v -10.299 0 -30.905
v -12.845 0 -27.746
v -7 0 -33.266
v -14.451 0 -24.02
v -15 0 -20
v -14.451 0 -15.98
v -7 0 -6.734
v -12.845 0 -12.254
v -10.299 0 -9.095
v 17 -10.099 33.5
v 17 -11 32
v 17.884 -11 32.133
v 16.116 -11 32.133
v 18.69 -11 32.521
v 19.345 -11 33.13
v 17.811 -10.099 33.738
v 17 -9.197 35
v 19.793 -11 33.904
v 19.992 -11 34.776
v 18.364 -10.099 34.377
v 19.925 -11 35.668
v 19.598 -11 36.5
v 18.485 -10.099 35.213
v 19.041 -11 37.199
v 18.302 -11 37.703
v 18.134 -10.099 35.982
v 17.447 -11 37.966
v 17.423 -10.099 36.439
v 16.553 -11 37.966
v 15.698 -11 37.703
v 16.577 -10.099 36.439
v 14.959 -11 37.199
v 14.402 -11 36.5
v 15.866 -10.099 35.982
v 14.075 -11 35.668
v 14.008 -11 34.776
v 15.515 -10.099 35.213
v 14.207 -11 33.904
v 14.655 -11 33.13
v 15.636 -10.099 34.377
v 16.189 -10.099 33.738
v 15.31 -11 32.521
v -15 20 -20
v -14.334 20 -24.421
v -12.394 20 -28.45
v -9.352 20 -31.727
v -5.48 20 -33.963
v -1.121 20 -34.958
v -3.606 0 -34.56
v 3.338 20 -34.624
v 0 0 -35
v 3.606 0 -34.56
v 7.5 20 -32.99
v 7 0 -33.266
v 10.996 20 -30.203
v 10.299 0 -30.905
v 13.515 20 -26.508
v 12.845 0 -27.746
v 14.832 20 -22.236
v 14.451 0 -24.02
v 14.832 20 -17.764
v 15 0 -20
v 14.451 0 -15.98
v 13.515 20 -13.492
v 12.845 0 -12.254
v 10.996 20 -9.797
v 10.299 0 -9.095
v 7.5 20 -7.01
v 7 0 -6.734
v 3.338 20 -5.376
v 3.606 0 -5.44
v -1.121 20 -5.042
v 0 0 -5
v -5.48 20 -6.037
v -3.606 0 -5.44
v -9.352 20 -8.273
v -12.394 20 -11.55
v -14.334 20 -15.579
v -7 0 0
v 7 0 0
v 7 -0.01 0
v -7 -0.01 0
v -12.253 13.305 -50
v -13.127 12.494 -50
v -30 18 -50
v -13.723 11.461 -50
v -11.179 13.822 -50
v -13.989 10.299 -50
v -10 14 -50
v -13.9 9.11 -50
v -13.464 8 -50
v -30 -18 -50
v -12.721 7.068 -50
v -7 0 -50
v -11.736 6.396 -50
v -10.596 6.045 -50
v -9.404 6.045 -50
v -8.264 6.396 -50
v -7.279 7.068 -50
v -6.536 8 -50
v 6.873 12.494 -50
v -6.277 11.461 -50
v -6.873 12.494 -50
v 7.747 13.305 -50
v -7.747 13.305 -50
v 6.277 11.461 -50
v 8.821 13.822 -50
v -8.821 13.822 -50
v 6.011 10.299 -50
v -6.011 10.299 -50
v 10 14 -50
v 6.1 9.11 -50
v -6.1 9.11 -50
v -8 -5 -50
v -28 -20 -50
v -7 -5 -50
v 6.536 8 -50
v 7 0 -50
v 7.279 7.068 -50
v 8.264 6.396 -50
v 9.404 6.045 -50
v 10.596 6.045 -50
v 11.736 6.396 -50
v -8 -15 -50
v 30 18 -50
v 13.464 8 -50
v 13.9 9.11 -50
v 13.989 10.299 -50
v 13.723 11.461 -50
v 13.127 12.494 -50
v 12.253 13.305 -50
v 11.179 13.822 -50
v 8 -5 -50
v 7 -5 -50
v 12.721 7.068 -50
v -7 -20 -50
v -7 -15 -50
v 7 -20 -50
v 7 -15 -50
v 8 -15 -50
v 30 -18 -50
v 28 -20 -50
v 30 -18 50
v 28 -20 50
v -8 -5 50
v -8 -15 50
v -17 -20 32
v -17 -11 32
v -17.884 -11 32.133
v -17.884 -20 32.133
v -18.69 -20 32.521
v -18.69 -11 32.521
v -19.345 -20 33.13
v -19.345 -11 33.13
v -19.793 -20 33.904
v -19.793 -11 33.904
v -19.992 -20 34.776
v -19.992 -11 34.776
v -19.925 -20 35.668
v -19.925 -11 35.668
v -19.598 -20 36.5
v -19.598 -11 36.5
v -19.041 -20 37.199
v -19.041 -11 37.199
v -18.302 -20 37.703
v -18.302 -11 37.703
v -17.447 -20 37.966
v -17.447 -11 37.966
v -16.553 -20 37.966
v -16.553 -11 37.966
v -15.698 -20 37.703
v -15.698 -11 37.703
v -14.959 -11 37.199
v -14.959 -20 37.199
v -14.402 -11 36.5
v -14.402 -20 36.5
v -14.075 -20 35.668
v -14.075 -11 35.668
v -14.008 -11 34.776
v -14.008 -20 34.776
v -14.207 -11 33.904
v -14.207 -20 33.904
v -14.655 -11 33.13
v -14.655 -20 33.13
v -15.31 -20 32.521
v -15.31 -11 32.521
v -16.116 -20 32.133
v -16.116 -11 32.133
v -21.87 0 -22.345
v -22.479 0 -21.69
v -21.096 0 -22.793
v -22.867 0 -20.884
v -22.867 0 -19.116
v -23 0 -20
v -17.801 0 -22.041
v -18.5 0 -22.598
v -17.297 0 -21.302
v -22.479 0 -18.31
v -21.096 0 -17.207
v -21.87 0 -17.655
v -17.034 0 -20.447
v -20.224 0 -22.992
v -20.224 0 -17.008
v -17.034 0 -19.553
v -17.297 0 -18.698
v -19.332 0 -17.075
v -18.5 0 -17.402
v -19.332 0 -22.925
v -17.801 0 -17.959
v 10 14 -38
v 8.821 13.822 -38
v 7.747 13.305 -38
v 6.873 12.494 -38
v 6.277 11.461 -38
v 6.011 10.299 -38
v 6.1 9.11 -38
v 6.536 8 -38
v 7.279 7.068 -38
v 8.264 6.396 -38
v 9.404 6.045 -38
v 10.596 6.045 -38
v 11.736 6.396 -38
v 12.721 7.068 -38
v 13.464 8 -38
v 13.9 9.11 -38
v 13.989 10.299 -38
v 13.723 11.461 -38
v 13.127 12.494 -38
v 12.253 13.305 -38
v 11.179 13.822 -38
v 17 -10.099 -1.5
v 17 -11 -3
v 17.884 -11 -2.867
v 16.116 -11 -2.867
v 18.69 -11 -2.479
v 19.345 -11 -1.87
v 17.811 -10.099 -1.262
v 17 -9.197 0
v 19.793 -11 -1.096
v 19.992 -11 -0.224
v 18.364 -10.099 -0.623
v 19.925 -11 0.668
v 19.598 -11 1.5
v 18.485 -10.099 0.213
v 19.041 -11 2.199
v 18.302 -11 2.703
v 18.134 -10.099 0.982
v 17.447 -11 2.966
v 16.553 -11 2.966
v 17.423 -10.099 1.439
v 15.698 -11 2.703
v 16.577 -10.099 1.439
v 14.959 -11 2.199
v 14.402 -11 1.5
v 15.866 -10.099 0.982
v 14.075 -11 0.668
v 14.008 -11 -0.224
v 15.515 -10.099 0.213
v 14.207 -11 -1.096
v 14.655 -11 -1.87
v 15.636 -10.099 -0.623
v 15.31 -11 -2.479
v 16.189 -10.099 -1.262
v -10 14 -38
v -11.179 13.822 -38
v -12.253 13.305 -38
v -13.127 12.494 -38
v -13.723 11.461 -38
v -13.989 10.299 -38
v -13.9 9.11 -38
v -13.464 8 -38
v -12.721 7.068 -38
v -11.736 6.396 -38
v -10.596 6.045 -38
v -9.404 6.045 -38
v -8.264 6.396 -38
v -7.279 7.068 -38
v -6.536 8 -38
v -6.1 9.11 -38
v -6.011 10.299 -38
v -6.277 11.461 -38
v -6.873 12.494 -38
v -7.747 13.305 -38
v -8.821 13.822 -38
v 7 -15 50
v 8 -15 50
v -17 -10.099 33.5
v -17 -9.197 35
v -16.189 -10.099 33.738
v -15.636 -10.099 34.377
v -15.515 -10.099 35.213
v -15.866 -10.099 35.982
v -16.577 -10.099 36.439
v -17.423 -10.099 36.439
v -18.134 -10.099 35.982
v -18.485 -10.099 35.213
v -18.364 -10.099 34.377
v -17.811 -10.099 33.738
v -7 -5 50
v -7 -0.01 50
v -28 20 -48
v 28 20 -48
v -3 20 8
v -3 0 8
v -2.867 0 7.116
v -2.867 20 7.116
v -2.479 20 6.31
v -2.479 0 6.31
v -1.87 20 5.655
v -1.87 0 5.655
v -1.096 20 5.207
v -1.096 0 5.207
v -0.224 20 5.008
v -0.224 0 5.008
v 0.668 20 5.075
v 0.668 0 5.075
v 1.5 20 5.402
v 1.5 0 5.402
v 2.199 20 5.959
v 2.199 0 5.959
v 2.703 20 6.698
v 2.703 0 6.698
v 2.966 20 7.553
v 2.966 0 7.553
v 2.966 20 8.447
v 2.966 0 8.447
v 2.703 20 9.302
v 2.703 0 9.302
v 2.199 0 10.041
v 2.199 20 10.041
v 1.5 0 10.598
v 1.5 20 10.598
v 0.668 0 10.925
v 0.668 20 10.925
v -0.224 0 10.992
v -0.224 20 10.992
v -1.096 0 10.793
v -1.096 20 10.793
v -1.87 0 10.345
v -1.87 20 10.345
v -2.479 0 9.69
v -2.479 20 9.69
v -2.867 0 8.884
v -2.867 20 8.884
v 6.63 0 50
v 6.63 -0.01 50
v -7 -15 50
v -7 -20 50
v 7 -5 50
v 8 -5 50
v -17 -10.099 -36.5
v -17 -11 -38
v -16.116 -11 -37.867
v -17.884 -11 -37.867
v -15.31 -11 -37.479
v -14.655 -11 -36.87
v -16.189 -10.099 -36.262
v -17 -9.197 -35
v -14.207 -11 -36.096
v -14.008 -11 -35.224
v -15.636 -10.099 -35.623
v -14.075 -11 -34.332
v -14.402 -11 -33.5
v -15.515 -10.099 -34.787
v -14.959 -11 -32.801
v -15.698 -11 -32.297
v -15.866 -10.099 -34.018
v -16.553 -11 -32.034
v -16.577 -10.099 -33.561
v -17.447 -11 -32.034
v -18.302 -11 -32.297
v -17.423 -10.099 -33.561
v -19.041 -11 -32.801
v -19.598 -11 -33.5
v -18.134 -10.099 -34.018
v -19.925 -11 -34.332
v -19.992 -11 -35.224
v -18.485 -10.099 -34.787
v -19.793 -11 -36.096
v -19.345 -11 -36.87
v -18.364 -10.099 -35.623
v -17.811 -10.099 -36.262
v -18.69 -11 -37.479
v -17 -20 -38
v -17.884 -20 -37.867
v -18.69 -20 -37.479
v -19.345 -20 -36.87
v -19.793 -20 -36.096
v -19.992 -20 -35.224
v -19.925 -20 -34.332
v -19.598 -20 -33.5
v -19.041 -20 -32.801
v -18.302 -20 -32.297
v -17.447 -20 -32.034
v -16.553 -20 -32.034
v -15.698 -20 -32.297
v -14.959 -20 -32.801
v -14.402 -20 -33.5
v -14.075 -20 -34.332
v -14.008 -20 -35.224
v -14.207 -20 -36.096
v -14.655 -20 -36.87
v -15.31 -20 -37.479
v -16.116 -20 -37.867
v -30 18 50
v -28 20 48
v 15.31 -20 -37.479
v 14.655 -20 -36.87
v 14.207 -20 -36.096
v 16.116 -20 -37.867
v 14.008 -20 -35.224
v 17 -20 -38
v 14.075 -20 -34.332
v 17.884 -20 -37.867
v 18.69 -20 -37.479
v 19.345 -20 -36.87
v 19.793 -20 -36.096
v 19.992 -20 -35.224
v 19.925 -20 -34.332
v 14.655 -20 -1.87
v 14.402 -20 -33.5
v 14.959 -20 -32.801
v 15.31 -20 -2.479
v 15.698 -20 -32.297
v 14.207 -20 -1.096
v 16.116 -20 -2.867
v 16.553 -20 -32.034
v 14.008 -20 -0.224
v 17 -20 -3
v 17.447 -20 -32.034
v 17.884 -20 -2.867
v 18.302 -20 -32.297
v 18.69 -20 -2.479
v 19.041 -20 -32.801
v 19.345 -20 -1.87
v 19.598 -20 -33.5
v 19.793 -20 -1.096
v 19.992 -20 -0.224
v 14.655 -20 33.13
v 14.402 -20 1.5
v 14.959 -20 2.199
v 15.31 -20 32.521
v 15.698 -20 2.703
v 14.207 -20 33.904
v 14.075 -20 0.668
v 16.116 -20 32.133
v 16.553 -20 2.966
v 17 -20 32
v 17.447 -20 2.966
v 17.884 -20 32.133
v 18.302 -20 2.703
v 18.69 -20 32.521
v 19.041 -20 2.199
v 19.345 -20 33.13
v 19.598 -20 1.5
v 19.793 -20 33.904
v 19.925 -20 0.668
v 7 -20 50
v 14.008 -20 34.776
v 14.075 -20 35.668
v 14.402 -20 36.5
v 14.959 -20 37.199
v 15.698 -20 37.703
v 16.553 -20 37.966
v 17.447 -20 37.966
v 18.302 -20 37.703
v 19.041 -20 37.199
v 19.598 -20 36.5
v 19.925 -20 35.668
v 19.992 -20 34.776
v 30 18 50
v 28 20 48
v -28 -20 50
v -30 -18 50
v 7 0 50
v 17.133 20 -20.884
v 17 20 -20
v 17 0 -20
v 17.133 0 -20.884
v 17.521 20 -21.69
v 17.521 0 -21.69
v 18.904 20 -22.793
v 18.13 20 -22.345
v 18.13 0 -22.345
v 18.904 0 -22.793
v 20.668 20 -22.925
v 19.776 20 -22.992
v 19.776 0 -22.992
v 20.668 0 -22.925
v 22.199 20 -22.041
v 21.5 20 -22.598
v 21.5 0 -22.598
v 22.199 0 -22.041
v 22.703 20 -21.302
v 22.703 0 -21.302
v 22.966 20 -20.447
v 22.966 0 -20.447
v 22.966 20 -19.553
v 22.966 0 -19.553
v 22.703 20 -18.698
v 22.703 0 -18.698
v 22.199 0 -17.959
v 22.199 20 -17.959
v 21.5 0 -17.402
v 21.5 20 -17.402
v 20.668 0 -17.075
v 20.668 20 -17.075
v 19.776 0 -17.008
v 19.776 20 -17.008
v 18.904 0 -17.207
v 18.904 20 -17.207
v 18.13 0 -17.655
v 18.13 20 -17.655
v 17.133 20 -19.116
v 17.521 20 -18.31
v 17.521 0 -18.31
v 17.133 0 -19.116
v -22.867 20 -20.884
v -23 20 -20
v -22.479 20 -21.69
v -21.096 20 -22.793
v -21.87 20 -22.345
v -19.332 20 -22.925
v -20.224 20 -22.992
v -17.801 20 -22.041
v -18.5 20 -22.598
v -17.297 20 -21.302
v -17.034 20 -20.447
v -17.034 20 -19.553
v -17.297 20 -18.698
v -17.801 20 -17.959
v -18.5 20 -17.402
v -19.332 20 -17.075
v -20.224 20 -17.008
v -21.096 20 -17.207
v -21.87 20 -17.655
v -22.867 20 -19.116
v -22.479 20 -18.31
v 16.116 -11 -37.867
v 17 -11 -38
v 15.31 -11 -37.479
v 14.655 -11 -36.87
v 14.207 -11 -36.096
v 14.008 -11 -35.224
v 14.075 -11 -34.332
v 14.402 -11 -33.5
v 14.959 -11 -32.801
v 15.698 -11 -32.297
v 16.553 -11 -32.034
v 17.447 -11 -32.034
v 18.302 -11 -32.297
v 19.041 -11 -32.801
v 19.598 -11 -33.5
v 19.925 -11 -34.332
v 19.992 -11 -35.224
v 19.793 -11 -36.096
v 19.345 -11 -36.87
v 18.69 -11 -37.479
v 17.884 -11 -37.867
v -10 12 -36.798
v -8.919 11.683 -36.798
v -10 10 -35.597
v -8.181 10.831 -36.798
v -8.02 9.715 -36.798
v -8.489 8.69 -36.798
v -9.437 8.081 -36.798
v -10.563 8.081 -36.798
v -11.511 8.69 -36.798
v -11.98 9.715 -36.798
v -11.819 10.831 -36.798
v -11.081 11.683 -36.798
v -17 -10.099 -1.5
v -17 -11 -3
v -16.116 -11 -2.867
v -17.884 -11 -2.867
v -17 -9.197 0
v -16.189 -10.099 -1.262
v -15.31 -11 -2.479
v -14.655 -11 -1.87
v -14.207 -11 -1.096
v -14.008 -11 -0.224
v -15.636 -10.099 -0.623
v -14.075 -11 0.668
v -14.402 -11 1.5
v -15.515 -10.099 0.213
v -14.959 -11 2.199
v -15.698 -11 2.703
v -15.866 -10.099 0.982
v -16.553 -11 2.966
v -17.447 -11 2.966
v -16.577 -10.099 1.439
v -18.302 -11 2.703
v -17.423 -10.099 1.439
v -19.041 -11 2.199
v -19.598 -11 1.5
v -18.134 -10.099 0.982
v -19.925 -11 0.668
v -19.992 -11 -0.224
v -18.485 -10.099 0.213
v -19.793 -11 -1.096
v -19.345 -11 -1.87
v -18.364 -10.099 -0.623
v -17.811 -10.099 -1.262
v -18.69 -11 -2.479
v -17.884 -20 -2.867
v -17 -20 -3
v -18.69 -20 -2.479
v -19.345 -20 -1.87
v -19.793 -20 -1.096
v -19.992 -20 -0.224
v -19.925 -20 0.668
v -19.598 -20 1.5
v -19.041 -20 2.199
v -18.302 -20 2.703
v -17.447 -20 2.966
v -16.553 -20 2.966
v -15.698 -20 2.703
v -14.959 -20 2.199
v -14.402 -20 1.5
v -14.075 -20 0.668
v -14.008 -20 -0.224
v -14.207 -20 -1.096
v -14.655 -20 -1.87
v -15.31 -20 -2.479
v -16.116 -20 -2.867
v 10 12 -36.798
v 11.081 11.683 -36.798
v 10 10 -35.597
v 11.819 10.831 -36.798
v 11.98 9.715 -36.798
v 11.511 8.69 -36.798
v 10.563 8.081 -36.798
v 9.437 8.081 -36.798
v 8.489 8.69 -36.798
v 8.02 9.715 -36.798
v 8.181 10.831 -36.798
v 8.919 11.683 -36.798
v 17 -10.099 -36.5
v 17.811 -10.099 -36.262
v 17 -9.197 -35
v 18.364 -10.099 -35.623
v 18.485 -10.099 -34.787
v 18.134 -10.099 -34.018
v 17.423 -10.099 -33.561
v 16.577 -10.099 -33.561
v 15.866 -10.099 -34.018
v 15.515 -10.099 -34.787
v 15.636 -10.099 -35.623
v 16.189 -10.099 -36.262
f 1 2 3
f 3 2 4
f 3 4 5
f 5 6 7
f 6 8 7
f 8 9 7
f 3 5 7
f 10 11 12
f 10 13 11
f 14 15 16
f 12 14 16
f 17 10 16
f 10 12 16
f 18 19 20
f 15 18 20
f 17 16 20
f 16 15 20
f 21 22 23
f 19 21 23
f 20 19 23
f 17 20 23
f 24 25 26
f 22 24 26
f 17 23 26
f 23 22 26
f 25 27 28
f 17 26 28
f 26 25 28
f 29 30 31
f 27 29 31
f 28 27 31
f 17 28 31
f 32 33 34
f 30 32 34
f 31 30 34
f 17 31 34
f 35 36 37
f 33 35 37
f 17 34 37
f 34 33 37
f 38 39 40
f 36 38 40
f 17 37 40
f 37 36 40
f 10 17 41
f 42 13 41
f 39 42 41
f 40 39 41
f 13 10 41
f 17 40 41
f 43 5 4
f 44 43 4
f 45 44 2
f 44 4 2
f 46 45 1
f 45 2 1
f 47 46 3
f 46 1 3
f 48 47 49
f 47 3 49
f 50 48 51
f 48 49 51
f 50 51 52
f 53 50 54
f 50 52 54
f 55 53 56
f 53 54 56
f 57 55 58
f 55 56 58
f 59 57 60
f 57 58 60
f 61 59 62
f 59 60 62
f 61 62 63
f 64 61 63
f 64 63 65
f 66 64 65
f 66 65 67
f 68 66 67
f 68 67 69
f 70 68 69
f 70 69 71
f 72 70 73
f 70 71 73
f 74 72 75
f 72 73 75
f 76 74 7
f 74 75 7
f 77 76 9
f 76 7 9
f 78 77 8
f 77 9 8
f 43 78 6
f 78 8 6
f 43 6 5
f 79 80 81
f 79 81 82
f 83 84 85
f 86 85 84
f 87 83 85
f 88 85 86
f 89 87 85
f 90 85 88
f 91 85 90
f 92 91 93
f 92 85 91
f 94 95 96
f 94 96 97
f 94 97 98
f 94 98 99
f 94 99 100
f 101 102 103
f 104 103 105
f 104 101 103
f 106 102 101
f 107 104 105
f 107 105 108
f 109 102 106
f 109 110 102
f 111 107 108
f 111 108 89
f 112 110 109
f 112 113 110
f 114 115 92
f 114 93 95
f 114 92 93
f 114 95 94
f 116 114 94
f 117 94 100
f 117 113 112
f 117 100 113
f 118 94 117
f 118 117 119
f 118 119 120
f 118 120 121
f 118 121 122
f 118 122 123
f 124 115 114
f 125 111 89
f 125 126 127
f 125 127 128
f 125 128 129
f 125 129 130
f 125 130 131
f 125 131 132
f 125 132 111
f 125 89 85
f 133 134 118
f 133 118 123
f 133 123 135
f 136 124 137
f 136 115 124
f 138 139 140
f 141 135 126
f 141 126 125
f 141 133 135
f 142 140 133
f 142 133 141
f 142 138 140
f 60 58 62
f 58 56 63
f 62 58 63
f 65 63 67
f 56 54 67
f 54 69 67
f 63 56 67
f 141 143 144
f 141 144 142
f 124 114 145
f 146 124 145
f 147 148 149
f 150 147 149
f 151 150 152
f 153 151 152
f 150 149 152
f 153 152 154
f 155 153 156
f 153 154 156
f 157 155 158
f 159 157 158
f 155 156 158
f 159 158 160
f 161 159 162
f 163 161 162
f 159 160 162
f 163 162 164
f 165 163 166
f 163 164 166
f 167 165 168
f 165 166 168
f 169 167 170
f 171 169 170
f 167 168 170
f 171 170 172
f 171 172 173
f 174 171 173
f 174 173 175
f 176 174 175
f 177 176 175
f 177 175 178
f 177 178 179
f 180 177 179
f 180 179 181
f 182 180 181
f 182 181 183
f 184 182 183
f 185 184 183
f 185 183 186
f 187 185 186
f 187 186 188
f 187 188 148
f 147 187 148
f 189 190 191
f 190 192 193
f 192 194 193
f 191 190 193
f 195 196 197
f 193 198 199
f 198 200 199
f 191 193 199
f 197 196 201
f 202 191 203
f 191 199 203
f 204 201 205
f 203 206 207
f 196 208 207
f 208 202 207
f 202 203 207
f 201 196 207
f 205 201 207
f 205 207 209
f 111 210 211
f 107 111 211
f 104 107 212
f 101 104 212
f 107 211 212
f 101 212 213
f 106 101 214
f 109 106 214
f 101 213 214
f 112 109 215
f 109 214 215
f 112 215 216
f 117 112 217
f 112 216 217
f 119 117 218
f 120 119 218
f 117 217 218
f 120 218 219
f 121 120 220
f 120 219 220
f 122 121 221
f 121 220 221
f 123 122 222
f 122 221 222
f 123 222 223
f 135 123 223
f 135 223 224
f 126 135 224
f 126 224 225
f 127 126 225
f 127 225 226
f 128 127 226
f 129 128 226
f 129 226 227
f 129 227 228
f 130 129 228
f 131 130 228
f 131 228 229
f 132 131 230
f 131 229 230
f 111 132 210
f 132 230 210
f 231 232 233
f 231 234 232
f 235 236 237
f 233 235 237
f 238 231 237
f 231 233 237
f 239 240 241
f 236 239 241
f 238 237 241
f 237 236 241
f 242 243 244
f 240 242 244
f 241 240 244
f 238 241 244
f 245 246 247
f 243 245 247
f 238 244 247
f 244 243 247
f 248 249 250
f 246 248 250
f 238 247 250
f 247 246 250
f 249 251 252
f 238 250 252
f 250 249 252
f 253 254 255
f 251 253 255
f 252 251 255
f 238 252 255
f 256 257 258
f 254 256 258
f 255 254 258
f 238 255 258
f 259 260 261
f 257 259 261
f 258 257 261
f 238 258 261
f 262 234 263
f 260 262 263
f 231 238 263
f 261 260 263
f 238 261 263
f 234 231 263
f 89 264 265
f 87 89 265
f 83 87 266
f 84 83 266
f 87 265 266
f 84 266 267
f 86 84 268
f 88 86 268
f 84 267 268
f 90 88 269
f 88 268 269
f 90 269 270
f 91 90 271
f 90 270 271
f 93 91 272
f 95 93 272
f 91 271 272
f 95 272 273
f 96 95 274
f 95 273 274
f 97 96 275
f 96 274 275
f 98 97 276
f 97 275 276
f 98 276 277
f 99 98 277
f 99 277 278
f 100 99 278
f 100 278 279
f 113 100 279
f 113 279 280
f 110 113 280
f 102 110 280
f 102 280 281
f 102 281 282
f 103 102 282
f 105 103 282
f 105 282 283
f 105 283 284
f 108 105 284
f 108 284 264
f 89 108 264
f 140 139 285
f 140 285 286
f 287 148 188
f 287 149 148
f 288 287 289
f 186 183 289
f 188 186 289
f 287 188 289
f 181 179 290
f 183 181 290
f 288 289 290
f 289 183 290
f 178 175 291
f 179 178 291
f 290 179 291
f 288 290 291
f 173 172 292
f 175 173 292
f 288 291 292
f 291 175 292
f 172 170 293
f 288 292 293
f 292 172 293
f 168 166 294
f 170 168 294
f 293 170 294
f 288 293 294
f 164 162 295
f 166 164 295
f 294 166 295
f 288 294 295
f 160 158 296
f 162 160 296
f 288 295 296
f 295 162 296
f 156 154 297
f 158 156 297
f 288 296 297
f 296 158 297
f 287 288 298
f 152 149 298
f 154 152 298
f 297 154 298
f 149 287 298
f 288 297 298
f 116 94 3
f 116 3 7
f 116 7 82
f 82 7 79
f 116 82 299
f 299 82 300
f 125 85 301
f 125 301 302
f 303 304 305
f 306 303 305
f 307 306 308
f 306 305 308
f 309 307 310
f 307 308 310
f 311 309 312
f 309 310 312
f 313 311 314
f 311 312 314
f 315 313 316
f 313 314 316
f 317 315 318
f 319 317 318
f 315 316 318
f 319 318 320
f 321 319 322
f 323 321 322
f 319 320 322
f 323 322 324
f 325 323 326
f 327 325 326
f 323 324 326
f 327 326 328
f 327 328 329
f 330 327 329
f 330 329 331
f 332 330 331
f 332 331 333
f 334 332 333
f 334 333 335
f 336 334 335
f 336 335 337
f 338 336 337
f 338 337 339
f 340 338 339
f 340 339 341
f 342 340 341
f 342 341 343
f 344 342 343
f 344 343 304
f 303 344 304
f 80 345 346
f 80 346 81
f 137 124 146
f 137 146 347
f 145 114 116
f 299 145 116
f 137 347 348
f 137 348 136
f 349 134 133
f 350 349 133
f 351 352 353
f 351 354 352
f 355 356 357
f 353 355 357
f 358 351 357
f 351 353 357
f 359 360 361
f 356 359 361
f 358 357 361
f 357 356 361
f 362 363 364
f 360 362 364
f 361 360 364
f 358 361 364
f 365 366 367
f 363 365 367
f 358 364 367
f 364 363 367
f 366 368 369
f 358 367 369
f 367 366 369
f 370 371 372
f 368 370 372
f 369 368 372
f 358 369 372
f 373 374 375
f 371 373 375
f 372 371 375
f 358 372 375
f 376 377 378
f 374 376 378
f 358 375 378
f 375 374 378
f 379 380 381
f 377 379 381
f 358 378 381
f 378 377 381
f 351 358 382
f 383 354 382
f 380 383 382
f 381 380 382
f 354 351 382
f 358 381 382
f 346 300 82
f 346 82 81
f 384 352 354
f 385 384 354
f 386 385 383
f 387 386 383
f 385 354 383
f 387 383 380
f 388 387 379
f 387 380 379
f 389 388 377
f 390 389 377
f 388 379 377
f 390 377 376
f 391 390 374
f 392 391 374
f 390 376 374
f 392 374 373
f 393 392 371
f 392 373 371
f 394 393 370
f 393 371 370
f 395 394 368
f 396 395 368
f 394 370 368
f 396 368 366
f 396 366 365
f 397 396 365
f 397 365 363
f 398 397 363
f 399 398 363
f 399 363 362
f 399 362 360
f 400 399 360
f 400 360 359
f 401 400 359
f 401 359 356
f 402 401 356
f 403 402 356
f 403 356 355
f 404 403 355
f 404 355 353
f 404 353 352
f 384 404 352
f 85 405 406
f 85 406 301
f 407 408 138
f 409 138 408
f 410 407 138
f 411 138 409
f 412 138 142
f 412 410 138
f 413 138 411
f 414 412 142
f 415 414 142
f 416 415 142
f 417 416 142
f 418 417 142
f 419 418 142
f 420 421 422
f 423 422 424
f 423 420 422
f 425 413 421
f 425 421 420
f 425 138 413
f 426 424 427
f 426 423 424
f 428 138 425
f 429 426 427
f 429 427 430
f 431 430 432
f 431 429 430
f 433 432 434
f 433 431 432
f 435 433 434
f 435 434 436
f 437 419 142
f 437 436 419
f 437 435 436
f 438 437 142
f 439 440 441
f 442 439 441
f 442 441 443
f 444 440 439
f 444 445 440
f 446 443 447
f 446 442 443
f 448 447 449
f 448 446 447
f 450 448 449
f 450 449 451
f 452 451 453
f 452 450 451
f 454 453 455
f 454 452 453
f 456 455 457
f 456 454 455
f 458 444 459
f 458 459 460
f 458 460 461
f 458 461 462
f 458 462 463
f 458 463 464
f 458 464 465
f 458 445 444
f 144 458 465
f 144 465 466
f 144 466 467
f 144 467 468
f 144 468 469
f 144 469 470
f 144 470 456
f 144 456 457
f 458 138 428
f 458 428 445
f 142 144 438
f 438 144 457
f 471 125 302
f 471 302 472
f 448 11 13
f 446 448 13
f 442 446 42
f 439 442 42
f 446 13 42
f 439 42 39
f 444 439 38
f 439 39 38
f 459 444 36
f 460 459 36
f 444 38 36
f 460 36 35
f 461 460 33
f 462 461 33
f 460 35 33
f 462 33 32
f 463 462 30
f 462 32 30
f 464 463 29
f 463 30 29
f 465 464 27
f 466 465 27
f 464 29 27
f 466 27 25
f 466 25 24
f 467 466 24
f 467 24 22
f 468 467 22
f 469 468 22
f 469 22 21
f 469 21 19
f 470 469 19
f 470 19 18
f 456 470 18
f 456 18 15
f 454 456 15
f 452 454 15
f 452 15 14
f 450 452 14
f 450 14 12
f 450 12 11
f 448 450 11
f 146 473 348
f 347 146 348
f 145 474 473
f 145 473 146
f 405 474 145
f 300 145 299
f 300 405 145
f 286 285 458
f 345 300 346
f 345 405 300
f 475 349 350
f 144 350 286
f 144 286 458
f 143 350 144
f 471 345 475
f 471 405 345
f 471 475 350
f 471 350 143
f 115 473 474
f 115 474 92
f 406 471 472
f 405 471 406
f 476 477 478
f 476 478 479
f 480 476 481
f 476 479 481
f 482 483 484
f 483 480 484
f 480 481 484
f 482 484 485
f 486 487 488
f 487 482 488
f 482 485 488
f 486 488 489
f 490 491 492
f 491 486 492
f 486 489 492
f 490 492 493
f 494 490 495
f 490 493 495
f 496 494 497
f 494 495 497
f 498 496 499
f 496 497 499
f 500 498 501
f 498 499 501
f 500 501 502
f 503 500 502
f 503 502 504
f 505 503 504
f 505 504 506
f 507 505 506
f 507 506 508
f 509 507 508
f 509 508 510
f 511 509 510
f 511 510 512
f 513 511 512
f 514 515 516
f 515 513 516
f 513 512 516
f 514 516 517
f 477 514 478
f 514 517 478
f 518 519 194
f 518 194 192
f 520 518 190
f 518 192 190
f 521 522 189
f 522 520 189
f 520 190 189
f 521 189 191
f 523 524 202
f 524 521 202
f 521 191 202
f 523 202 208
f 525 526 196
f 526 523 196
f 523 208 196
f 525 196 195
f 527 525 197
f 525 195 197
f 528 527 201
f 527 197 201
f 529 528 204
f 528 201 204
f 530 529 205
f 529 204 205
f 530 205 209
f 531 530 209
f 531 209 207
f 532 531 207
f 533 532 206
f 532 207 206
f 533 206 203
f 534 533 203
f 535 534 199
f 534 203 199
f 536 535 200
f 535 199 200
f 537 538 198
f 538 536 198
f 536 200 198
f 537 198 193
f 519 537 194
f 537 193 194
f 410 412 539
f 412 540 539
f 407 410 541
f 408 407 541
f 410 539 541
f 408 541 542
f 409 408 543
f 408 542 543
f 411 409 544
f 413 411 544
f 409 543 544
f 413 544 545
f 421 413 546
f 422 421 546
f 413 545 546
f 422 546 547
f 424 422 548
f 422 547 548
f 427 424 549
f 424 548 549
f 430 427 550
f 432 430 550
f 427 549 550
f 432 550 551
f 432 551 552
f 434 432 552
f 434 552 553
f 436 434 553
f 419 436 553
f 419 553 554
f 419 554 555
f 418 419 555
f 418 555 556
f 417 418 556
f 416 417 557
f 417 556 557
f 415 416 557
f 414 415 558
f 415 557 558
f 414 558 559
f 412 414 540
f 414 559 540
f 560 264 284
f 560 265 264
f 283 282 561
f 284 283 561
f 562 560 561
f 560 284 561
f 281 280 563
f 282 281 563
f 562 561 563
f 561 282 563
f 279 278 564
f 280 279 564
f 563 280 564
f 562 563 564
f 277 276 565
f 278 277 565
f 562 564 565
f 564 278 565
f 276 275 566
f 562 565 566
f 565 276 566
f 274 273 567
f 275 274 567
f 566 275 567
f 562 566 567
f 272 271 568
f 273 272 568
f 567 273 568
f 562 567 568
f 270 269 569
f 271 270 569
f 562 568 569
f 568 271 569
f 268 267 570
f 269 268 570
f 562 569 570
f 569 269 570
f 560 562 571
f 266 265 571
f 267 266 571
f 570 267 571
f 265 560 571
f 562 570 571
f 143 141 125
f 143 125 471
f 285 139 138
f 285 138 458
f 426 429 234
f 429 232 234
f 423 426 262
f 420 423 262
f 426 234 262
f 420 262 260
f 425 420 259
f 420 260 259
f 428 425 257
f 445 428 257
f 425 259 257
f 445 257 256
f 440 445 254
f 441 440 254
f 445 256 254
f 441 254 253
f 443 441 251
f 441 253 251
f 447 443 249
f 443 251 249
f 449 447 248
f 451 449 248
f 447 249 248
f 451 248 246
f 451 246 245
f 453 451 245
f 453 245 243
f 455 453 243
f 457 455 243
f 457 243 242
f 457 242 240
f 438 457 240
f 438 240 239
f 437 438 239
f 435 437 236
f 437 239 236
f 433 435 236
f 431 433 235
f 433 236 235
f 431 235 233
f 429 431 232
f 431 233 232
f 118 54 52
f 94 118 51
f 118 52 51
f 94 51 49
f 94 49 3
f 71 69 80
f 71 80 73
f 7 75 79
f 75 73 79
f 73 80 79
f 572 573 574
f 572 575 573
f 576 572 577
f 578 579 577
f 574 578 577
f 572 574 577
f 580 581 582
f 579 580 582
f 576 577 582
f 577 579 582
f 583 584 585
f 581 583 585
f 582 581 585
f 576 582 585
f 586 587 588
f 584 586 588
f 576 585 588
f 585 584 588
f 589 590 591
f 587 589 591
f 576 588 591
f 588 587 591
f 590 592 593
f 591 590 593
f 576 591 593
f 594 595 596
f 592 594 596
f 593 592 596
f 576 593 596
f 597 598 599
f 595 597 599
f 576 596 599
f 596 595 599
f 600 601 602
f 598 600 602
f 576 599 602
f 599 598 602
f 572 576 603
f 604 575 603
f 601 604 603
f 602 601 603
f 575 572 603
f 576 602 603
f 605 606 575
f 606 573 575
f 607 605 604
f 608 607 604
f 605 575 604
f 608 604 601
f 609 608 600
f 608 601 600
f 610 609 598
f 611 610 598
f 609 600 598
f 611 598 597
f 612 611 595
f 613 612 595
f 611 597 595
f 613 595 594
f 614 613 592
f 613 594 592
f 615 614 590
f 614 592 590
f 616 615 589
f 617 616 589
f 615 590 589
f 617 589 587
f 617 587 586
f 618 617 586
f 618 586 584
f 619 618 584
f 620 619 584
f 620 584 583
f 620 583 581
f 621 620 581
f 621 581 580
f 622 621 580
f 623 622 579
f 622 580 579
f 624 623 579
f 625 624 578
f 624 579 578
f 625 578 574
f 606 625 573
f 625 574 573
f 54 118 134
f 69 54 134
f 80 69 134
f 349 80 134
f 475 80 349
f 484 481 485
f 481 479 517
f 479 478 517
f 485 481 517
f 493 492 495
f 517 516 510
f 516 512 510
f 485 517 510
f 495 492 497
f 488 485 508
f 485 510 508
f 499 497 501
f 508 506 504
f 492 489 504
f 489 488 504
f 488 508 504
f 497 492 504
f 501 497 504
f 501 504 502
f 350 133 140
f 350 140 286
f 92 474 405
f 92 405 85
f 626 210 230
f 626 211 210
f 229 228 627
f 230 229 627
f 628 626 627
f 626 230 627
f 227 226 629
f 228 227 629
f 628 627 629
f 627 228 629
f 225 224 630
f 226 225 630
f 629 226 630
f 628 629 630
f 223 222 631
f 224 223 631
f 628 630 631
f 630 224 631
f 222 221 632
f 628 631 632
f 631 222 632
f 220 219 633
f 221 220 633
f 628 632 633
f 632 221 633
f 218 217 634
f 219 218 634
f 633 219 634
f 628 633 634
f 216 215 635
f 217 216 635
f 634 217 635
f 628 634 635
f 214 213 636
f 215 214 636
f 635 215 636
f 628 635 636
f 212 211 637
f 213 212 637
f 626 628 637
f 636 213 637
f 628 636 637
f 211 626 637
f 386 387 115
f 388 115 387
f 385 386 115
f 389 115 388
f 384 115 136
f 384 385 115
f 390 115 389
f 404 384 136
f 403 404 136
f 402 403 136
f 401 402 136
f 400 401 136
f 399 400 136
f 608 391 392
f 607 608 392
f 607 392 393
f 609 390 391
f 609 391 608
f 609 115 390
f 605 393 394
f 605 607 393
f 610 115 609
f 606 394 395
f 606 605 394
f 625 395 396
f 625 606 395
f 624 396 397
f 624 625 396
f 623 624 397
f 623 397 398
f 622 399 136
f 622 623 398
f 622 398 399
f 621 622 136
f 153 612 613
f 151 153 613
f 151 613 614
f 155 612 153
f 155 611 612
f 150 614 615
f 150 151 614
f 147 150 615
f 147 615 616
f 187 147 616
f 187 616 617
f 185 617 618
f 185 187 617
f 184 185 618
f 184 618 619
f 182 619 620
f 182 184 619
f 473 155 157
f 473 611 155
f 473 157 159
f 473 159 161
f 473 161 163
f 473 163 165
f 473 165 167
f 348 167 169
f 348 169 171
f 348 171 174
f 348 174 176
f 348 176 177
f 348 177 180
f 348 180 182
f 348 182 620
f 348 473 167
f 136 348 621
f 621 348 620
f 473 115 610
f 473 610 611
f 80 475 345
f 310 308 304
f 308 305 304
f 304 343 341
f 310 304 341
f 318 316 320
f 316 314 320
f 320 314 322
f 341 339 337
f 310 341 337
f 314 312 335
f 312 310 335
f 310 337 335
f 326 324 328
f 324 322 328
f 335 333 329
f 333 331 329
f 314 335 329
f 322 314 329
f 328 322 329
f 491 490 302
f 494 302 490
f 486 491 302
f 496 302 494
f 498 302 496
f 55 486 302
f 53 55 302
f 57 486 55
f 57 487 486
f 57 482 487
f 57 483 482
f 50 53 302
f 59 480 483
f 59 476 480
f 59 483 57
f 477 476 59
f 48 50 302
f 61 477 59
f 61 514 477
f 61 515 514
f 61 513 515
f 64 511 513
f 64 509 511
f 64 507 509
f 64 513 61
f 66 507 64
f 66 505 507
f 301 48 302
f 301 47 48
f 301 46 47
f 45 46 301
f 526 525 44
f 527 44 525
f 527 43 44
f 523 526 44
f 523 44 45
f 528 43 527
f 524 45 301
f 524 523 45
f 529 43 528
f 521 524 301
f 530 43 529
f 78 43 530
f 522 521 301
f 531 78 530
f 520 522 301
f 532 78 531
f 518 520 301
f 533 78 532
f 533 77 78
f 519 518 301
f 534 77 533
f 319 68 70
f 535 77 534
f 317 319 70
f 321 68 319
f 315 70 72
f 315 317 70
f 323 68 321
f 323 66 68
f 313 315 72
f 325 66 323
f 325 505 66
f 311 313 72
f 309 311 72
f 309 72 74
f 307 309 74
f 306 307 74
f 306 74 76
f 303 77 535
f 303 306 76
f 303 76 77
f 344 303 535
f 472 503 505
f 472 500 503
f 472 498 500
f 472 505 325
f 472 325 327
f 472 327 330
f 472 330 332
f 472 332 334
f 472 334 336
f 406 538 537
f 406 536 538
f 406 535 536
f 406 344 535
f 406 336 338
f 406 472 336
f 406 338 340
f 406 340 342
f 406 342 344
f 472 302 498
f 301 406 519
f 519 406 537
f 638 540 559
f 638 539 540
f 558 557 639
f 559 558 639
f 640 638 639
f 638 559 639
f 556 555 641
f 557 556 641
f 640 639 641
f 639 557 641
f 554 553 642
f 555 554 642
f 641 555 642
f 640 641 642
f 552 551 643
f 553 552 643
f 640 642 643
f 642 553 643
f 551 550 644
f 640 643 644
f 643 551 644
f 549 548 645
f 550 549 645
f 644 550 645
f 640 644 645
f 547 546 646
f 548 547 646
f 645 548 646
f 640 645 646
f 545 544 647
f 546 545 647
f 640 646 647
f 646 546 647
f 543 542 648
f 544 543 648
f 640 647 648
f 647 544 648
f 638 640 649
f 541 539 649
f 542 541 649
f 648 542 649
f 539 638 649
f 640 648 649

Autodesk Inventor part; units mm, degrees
ref_plane "YZ Plane" through (0, 0, 0) normal (1, 0, 0) x (0, 1, 0)
ref_plane "XZ Plane" through (0, 0, 0) normal (0, 1, 0) x (-1, 0, 0)
ref_plane "XY Plane" through (0, 0, 0) normal (0, 0, 1) x (1, 0, 0)
sketch "Sketch1" plane through (0, 0, 0) normal (0, 1, 0) x (-1, 0, 0)
  line L0 (-30, 50) -> (30, 50)
  line L1 (30, 50) -> (30, -50)
  line L2 (30, -50) -> (-30, -50)
  line L3 (-30, -50) -> (-30, 50)
  line L4 (-30, 50) -> (30, -50) construction
  line L5 (30, 50) -> (-30, -50) construction
  circle A0 centre (0, 8) radius 3
  circle A1 centre (20, -20) radius 3
  circle A2 centre (-20, -20) radius 3
  circle A3 centre (0, -20) radius 15
  point P0 (0, 0)
  dimension "d0" = 60
  dimension "d1" = 100
  dimension "d2" = 6
  dimension "d3" = 6
  dimension "d5" = 58
  dimension "d6" = 10
  dimension "d8" = 30
  dimension "d9" = 6
  dimension "d10" = 10
  dimension "d11" = 30
  dimension "d12" = 30
extrude "Extrusion1" add sketch "Sketch1" along normal blind 20
sketch "Sketch2" plane through (0, 0, 0) normal (0, -1, 0) x (1, 0, 0)
  line L0 (30, -50) -> (-30, -50) projected
  line L1 (7, -50) -> (7, 50)
  line L2 (-7, -50) -> (-7, 50)
  line L3 (30, 50) -> (30, -50) projected
  line L4 (-30, -50) -> (-30, 50) projected
  line L5 (7, -50) -> (30, -50)
  line L6 (30, 50) -> (30, -50) projected
  line L7 (30, 50) -> (7, 50)
  line L8 (-30, 50) -> (30, 50) projected
  line L9 (-7, -50) -> (-30, -50)
  line L10 (-30, -50) -> (-30, 50) projected
  line L11 (-30, 50) -> (-7, 50)
  point P0 (0, 0)
  dimension "d15" = 23
  dimension "d16" = 23
extrude "Extrusion2" add sketch "Sketch2" along normal blind 5 contours L0 L1 L7 L3 | L0 L4 L8 L2
sketch "Sketch3" plane through (0, -5, 0) normal (0, -1, 0) x (1, 0, 0)
  line L0 (30, -50) -> (-30, -50) projected
  line L1 (8, -50) -> (8, 50)
  line L2 (-30, 50) -> (30, 50) projected
  line L3 (-8, -50) -> (-8, 50)
  line L4 (30, -50) -> (30, 50) projected
  line L5 (-30, 50) -> (-30, -50) projected
  line L6 (8, -50) -> (30, -50)
  line L7 (30, 50) -> (30, -50) projected
  line L8 (30, 50) -> (8, 50)
  line L9 (-8, 50) -> (-30, 50)
  line L10 (-30, -50) -> (-8, -50)
  point P0 (0, 0)
  dimension "d19" = 22
  dimension "d20" = 22
extrude "Extrusion3" add sketch "Sketch3" along normal blind 10 contours L0 L1 L2 L4 | L0 L5 L2 L3
sketch "Sketch4" plane through (0, -15, 0) normal (0, -1, 0) x (1, 0, 0)
  line L0 (8, -50) -> (30, -50) projected
  line L1 (7, -50) -> (7, 50)
  line L2 (-30, 50) -> (30, 50) projected
  line L3 (-30, -50) -> (-8, -50) projected
  line L4 (30, -50) -> (30, 50) projected
  line L5 (-30, 50) -> (-30, -50) projected
  line L6 (7, -50) -> (30, -50)
  line L7 (30, 50) -> (30, -50) projected
  line L8 (30, 50) -> (7, 50)
  line L9 (-30, -50) -> (-30, 50) projected
  line L10 (-30, -50) -> (-30, 50)
  line L11 (-30, -50) -> (-7, -50)
  line L12 (-30, 50) -> (-7, 50)
  line L13 (-7, 50) -> (-7, -50)
  point P0 (0, 0)
  dimension "d23" = 23
  dimension "d25" = 23
  dimension "d26" = 100
extrude "Extrusion4" add sketch "Sketch4" along normal blind 5
sketch "Sketch5" plane through (0, -20, 0) normal (0, -1, 0) x (1, 0, 0)
  circle A0 centre (17, -35) radius 3
  circle A1 centre (17, 0) radius 3
  circle A2 centre (17, 35) radius 3
  circle A3 centre (-17, 35) radius 3
  circle A4 centre (-17, 0) radius 3
  circle A5 centre (-17, -35) radius 3
  line L0 (-7, 50) -> (-30, 50) projected
  line L1 (-30, 50) -> (-30, -50) projected
  line L2 (30, -50) -> (30, 50) projected
  point P0 (0, 0)
  dimension "d29" = 6
  dimension "d30" = 6
  dimension "d31" = 6
  dimension "d32" = 6
  dimension "d33" = 6
  dimension "d34" = 6
  dimension "d35" = 15
  dimension "d36" = 35
  dimension "d37" = 70
  dimension "d38" = 13
  dimension "d39" = 13
hole "Hole1" at (17, -20, -35) at (17, -20, 0) at (17, -20, 35) at (-17, -20, 35) at (-17, -20, 0) at (-17, -20, -35) direction (0, 1, 0) diameter 6 depth 9 tip angle 118
chamfer "Chamfer1" distance 2 angle 45 1 edges at (30, -20, 0) measured on face at (26.6594, -20, 0.1205)
chamfer "Chamfer2" distance 2 angle 45 1 edges at (-30, -20, 0) measured on face at (-26.6594, -20, -0.1205)
chamfer "Chamfer3" distance 2 angle 45 1 edges at (30, 20, 0) measured on face at (0.1205, 20, 36.9927)
chamfer "Chamfer4" distance 2 angle 45 1 edges at (-30, 20, 0) measured on face at (-0.7872, 20, 36.9927)
chamfer "Chamfer5" distance 2 angle 45 1 edges at (0, 20, -50) measured on face at (-0.1205, 20, 36.9927)
chamfer "Chamfer6" distance 2 angle 45 1 edges at (0, 20, 50) measured on face at (0.1205, 20, 36.9927)
sketch "Sketch6" plane through (7, 0, -50) normal (0, 0, -1) x (-1, 0, 0)
  circle A0 centre (17, 10) radius 4
  circle A1 centre (-3, 10) radius 4
  line L0 (37, -18) -> (37, 18) projected
  line L1 (-23, 18) -> (-23, -18) projected
  line L2 (35, 20) -> (-21, 20) projected
  point P0 (7, 0)
  dimension "d65" = 8
  dimension "d66" = 8
  dimension "d67" = 20
  dimension "d68" = 20
  dimension "d69" = 10
hole "Hole2" at (10, 10, -50) at (-10, 10, -50) direction (0, 0, 1) diameter 8 depth 12 tip angle 118
sketch "Sketch7" plane through (0, 20, 0) normal (0, 1, 0) x (1, 0, 0)
  point P0 (0, 0)
sketch "Sketch8" plane through (0, 0, 0) normal (0, -1, 0) x (1, 0, 0)
  line L0 (6.6295, 50) -> (7, 0)
  line L1 (7, -6.7335) -> (7, 50) projected
  line L2 (-7, 50) -> (-7, -6.7335) projected
  line L3 (-7, 0) -> (-7, 50)
  line L4 (-7, 50) -> (6.6295, 50)
  line L5 (-7, 50) -> (7, 50) projected
  line L6 (7, 0) -> (-7, 0)
  point P0 (0, 0)
extrude "Extrusion5" add sketch "Sketch8" along normal blind 0.01 contours L0 L6 L2 L4
sketch "Sketch9" plane through (0, 20, 0) normal (0, 1, 0) x (1, 0, 0)
  circle A0 centre (0, -8) radius 3
  line L0 (30, 50) -> (-30, 50) projected
  point P0 (0, 0)
  dimension "d79" = 6
  dimension "d80" = 58
hole "Hole3" at (0, 20, 8) direction (0, -1, 0) diameter 6 depth 10 tip angle 118
properties part number "Schneidführung"
